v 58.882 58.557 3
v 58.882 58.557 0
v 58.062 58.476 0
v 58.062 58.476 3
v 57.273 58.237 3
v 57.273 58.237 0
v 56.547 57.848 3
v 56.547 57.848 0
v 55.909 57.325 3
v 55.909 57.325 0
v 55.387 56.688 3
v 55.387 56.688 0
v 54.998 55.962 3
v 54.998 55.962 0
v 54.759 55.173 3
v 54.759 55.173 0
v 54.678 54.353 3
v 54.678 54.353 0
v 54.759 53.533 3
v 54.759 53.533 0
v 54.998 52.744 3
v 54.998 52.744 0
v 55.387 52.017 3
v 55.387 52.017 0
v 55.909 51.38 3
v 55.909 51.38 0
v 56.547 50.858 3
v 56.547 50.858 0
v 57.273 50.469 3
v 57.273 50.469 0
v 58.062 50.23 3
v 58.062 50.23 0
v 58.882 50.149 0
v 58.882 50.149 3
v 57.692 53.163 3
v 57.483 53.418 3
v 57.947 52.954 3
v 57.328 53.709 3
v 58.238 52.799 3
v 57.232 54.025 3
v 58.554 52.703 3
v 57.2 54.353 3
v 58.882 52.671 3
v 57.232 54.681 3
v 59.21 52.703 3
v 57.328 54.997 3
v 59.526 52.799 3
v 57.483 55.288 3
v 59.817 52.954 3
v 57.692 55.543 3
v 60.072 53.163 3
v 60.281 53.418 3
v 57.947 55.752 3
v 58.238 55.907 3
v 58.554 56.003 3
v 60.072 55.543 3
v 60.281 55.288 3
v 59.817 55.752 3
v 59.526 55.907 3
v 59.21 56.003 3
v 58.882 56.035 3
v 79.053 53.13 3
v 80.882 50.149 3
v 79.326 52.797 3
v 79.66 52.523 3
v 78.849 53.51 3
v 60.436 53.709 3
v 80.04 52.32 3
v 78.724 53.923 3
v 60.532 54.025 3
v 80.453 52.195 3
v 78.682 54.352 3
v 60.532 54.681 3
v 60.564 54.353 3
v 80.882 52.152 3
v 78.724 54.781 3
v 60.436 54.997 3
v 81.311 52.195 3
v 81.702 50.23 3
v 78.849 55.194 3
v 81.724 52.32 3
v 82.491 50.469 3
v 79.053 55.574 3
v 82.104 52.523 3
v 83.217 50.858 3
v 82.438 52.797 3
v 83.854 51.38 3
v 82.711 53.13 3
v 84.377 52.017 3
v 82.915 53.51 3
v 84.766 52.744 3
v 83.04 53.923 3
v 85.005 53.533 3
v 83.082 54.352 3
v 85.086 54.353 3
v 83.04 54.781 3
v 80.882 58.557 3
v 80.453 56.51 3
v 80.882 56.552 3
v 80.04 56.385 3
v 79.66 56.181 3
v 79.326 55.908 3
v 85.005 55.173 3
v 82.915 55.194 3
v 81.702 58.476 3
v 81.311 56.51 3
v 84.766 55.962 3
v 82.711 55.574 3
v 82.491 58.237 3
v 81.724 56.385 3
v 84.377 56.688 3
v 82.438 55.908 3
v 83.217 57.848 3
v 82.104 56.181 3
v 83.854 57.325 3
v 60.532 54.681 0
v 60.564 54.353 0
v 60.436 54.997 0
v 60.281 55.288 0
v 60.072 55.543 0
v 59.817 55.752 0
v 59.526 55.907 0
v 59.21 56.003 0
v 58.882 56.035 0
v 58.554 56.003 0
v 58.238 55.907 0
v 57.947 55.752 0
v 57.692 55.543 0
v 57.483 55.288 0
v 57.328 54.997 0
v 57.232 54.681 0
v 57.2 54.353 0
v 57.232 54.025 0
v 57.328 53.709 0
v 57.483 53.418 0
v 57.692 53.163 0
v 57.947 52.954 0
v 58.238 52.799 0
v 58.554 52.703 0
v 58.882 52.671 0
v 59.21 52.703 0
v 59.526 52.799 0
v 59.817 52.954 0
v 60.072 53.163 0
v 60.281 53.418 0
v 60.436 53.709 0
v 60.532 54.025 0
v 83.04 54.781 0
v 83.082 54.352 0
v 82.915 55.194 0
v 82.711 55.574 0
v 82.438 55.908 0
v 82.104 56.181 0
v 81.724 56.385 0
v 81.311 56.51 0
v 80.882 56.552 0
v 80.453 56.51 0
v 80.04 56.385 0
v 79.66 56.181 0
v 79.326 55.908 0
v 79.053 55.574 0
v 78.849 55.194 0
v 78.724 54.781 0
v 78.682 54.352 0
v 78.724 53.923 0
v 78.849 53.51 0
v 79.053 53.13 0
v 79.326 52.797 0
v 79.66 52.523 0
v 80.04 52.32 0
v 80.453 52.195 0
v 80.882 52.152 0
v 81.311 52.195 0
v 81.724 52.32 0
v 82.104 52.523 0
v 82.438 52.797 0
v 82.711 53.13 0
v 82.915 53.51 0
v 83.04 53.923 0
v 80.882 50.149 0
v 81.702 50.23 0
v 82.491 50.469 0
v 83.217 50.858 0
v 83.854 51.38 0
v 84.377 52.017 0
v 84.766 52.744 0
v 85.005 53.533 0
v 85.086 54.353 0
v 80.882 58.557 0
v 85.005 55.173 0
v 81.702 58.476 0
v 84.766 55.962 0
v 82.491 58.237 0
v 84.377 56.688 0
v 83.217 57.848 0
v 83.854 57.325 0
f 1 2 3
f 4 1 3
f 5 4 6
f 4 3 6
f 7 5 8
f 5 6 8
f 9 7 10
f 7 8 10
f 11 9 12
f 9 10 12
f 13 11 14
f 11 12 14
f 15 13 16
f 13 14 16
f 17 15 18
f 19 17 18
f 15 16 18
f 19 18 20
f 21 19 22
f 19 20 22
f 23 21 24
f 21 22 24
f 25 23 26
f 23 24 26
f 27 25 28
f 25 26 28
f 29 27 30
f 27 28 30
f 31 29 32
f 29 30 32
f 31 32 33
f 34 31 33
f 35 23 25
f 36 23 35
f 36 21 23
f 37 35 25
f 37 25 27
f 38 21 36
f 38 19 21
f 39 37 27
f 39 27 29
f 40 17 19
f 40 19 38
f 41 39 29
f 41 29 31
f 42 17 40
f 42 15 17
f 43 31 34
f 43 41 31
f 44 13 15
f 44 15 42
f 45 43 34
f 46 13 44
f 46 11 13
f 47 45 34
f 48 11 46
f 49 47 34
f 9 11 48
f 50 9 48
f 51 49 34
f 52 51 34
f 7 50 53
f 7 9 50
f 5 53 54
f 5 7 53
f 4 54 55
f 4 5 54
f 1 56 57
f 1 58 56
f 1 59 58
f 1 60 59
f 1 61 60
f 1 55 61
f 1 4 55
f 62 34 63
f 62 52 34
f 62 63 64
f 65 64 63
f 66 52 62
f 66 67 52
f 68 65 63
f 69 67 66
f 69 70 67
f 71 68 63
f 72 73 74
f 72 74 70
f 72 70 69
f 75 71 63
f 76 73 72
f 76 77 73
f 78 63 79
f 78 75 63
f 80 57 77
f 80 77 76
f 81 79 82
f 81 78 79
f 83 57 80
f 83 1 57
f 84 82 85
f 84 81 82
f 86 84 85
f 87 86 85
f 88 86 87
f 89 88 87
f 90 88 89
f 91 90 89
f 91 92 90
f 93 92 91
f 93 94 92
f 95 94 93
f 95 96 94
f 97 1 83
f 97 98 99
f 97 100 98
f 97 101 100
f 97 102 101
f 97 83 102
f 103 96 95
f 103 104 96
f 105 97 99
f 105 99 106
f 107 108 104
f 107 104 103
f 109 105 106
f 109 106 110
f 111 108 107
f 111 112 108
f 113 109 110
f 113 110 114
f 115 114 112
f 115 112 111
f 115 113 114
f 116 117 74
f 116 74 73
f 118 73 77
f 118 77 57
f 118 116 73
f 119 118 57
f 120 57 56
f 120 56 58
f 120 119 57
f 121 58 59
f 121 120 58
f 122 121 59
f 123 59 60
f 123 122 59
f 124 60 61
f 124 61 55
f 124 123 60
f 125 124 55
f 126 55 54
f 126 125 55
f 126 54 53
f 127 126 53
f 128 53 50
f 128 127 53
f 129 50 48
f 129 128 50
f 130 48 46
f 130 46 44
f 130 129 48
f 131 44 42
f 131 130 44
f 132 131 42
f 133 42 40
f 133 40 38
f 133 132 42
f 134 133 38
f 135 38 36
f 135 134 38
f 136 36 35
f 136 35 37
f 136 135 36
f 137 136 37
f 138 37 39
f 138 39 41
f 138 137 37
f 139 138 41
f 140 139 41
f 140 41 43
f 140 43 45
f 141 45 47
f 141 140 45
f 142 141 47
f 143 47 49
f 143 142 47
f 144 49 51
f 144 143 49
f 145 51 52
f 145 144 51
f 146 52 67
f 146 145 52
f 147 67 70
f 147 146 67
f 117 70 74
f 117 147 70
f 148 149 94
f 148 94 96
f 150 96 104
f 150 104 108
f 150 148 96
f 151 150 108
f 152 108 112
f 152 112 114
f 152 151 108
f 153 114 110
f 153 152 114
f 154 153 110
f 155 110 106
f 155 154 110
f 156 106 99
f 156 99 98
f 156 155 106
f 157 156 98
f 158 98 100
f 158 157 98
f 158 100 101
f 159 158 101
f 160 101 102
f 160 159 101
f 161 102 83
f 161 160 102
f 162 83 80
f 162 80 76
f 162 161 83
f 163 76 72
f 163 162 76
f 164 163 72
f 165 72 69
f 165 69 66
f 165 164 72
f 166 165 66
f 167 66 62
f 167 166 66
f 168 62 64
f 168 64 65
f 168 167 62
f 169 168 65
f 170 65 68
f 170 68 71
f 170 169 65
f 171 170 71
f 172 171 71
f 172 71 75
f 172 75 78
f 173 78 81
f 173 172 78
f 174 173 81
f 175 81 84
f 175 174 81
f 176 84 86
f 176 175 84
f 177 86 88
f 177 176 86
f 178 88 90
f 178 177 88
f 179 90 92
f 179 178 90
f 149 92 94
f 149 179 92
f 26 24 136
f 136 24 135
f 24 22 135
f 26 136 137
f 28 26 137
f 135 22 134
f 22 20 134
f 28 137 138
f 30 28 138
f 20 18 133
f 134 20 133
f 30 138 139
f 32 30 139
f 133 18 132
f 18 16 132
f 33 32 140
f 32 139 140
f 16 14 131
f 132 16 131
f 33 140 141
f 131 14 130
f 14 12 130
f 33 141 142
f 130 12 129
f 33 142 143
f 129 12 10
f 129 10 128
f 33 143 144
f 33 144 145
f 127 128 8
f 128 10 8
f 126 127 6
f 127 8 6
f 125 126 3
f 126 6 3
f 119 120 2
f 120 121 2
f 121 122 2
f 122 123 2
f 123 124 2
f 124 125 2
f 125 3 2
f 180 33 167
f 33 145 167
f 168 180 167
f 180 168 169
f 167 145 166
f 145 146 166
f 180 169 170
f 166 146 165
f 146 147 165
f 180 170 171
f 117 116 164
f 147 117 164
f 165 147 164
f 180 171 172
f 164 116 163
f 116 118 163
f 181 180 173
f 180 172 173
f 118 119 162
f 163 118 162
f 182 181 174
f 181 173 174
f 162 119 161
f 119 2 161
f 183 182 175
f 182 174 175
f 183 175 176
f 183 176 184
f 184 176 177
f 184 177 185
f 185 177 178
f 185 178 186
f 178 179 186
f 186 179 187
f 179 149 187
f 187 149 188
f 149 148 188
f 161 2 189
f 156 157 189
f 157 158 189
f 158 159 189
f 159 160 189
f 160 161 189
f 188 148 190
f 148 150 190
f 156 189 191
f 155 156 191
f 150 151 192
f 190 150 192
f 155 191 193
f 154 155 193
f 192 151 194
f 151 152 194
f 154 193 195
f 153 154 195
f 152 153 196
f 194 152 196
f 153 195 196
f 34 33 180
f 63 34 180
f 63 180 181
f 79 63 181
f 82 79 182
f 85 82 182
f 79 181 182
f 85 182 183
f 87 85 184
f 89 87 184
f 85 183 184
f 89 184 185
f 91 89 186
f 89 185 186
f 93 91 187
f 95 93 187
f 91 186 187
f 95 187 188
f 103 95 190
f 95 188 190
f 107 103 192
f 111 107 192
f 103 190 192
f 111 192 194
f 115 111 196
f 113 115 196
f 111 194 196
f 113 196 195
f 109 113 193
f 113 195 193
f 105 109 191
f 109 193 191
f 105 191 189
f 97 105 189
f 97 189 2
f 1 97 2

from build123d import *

# Parameters (mm, degrees)
MODEL_R             = 2.199999997
MODEL_R_2           = 1.682352939
BOSS_EXTRUDE1_DEPTH = 3


with BuildPart() as part:
    # Model → Boss-Extrude1 (new body)
    with BuildSketch(Plane.XY):
        with BuildLine():
            Line((64.051409634, 50.149226664), (78.999546271, 50.149226664))
            Line((78.999546271, 50.149226664), (80.881972122, 50.149226664))
            ThreePointArc((80.881972122, 50.149226664), (85.085686549, 54.352941092), (80.881972122, 58.55665552))
            Line((80.881972122, 58.55665552), (58.88197211, 58.55665552))
            ThreePointArc((58.88197211, 58.55665552), (54.678257705, 54.352941069), (58.881972156, 50.149226664))
            Line((58.881972156, 50.149226664), (64.051409634, 50.149226664))
        make_face()
        with Locations((80.881972122, 54.352233082)):
            Circle(MODEL_R, mode=Mode.SUBTRACT)
        with Locations((58.881972133, 54.352941092)):
            Circle(MODEL_R_2, mode=Mode.SUBTRACT)
    extrude(amount=BOSS_EXTRUDE1_DEPTH)


solid = part.part
